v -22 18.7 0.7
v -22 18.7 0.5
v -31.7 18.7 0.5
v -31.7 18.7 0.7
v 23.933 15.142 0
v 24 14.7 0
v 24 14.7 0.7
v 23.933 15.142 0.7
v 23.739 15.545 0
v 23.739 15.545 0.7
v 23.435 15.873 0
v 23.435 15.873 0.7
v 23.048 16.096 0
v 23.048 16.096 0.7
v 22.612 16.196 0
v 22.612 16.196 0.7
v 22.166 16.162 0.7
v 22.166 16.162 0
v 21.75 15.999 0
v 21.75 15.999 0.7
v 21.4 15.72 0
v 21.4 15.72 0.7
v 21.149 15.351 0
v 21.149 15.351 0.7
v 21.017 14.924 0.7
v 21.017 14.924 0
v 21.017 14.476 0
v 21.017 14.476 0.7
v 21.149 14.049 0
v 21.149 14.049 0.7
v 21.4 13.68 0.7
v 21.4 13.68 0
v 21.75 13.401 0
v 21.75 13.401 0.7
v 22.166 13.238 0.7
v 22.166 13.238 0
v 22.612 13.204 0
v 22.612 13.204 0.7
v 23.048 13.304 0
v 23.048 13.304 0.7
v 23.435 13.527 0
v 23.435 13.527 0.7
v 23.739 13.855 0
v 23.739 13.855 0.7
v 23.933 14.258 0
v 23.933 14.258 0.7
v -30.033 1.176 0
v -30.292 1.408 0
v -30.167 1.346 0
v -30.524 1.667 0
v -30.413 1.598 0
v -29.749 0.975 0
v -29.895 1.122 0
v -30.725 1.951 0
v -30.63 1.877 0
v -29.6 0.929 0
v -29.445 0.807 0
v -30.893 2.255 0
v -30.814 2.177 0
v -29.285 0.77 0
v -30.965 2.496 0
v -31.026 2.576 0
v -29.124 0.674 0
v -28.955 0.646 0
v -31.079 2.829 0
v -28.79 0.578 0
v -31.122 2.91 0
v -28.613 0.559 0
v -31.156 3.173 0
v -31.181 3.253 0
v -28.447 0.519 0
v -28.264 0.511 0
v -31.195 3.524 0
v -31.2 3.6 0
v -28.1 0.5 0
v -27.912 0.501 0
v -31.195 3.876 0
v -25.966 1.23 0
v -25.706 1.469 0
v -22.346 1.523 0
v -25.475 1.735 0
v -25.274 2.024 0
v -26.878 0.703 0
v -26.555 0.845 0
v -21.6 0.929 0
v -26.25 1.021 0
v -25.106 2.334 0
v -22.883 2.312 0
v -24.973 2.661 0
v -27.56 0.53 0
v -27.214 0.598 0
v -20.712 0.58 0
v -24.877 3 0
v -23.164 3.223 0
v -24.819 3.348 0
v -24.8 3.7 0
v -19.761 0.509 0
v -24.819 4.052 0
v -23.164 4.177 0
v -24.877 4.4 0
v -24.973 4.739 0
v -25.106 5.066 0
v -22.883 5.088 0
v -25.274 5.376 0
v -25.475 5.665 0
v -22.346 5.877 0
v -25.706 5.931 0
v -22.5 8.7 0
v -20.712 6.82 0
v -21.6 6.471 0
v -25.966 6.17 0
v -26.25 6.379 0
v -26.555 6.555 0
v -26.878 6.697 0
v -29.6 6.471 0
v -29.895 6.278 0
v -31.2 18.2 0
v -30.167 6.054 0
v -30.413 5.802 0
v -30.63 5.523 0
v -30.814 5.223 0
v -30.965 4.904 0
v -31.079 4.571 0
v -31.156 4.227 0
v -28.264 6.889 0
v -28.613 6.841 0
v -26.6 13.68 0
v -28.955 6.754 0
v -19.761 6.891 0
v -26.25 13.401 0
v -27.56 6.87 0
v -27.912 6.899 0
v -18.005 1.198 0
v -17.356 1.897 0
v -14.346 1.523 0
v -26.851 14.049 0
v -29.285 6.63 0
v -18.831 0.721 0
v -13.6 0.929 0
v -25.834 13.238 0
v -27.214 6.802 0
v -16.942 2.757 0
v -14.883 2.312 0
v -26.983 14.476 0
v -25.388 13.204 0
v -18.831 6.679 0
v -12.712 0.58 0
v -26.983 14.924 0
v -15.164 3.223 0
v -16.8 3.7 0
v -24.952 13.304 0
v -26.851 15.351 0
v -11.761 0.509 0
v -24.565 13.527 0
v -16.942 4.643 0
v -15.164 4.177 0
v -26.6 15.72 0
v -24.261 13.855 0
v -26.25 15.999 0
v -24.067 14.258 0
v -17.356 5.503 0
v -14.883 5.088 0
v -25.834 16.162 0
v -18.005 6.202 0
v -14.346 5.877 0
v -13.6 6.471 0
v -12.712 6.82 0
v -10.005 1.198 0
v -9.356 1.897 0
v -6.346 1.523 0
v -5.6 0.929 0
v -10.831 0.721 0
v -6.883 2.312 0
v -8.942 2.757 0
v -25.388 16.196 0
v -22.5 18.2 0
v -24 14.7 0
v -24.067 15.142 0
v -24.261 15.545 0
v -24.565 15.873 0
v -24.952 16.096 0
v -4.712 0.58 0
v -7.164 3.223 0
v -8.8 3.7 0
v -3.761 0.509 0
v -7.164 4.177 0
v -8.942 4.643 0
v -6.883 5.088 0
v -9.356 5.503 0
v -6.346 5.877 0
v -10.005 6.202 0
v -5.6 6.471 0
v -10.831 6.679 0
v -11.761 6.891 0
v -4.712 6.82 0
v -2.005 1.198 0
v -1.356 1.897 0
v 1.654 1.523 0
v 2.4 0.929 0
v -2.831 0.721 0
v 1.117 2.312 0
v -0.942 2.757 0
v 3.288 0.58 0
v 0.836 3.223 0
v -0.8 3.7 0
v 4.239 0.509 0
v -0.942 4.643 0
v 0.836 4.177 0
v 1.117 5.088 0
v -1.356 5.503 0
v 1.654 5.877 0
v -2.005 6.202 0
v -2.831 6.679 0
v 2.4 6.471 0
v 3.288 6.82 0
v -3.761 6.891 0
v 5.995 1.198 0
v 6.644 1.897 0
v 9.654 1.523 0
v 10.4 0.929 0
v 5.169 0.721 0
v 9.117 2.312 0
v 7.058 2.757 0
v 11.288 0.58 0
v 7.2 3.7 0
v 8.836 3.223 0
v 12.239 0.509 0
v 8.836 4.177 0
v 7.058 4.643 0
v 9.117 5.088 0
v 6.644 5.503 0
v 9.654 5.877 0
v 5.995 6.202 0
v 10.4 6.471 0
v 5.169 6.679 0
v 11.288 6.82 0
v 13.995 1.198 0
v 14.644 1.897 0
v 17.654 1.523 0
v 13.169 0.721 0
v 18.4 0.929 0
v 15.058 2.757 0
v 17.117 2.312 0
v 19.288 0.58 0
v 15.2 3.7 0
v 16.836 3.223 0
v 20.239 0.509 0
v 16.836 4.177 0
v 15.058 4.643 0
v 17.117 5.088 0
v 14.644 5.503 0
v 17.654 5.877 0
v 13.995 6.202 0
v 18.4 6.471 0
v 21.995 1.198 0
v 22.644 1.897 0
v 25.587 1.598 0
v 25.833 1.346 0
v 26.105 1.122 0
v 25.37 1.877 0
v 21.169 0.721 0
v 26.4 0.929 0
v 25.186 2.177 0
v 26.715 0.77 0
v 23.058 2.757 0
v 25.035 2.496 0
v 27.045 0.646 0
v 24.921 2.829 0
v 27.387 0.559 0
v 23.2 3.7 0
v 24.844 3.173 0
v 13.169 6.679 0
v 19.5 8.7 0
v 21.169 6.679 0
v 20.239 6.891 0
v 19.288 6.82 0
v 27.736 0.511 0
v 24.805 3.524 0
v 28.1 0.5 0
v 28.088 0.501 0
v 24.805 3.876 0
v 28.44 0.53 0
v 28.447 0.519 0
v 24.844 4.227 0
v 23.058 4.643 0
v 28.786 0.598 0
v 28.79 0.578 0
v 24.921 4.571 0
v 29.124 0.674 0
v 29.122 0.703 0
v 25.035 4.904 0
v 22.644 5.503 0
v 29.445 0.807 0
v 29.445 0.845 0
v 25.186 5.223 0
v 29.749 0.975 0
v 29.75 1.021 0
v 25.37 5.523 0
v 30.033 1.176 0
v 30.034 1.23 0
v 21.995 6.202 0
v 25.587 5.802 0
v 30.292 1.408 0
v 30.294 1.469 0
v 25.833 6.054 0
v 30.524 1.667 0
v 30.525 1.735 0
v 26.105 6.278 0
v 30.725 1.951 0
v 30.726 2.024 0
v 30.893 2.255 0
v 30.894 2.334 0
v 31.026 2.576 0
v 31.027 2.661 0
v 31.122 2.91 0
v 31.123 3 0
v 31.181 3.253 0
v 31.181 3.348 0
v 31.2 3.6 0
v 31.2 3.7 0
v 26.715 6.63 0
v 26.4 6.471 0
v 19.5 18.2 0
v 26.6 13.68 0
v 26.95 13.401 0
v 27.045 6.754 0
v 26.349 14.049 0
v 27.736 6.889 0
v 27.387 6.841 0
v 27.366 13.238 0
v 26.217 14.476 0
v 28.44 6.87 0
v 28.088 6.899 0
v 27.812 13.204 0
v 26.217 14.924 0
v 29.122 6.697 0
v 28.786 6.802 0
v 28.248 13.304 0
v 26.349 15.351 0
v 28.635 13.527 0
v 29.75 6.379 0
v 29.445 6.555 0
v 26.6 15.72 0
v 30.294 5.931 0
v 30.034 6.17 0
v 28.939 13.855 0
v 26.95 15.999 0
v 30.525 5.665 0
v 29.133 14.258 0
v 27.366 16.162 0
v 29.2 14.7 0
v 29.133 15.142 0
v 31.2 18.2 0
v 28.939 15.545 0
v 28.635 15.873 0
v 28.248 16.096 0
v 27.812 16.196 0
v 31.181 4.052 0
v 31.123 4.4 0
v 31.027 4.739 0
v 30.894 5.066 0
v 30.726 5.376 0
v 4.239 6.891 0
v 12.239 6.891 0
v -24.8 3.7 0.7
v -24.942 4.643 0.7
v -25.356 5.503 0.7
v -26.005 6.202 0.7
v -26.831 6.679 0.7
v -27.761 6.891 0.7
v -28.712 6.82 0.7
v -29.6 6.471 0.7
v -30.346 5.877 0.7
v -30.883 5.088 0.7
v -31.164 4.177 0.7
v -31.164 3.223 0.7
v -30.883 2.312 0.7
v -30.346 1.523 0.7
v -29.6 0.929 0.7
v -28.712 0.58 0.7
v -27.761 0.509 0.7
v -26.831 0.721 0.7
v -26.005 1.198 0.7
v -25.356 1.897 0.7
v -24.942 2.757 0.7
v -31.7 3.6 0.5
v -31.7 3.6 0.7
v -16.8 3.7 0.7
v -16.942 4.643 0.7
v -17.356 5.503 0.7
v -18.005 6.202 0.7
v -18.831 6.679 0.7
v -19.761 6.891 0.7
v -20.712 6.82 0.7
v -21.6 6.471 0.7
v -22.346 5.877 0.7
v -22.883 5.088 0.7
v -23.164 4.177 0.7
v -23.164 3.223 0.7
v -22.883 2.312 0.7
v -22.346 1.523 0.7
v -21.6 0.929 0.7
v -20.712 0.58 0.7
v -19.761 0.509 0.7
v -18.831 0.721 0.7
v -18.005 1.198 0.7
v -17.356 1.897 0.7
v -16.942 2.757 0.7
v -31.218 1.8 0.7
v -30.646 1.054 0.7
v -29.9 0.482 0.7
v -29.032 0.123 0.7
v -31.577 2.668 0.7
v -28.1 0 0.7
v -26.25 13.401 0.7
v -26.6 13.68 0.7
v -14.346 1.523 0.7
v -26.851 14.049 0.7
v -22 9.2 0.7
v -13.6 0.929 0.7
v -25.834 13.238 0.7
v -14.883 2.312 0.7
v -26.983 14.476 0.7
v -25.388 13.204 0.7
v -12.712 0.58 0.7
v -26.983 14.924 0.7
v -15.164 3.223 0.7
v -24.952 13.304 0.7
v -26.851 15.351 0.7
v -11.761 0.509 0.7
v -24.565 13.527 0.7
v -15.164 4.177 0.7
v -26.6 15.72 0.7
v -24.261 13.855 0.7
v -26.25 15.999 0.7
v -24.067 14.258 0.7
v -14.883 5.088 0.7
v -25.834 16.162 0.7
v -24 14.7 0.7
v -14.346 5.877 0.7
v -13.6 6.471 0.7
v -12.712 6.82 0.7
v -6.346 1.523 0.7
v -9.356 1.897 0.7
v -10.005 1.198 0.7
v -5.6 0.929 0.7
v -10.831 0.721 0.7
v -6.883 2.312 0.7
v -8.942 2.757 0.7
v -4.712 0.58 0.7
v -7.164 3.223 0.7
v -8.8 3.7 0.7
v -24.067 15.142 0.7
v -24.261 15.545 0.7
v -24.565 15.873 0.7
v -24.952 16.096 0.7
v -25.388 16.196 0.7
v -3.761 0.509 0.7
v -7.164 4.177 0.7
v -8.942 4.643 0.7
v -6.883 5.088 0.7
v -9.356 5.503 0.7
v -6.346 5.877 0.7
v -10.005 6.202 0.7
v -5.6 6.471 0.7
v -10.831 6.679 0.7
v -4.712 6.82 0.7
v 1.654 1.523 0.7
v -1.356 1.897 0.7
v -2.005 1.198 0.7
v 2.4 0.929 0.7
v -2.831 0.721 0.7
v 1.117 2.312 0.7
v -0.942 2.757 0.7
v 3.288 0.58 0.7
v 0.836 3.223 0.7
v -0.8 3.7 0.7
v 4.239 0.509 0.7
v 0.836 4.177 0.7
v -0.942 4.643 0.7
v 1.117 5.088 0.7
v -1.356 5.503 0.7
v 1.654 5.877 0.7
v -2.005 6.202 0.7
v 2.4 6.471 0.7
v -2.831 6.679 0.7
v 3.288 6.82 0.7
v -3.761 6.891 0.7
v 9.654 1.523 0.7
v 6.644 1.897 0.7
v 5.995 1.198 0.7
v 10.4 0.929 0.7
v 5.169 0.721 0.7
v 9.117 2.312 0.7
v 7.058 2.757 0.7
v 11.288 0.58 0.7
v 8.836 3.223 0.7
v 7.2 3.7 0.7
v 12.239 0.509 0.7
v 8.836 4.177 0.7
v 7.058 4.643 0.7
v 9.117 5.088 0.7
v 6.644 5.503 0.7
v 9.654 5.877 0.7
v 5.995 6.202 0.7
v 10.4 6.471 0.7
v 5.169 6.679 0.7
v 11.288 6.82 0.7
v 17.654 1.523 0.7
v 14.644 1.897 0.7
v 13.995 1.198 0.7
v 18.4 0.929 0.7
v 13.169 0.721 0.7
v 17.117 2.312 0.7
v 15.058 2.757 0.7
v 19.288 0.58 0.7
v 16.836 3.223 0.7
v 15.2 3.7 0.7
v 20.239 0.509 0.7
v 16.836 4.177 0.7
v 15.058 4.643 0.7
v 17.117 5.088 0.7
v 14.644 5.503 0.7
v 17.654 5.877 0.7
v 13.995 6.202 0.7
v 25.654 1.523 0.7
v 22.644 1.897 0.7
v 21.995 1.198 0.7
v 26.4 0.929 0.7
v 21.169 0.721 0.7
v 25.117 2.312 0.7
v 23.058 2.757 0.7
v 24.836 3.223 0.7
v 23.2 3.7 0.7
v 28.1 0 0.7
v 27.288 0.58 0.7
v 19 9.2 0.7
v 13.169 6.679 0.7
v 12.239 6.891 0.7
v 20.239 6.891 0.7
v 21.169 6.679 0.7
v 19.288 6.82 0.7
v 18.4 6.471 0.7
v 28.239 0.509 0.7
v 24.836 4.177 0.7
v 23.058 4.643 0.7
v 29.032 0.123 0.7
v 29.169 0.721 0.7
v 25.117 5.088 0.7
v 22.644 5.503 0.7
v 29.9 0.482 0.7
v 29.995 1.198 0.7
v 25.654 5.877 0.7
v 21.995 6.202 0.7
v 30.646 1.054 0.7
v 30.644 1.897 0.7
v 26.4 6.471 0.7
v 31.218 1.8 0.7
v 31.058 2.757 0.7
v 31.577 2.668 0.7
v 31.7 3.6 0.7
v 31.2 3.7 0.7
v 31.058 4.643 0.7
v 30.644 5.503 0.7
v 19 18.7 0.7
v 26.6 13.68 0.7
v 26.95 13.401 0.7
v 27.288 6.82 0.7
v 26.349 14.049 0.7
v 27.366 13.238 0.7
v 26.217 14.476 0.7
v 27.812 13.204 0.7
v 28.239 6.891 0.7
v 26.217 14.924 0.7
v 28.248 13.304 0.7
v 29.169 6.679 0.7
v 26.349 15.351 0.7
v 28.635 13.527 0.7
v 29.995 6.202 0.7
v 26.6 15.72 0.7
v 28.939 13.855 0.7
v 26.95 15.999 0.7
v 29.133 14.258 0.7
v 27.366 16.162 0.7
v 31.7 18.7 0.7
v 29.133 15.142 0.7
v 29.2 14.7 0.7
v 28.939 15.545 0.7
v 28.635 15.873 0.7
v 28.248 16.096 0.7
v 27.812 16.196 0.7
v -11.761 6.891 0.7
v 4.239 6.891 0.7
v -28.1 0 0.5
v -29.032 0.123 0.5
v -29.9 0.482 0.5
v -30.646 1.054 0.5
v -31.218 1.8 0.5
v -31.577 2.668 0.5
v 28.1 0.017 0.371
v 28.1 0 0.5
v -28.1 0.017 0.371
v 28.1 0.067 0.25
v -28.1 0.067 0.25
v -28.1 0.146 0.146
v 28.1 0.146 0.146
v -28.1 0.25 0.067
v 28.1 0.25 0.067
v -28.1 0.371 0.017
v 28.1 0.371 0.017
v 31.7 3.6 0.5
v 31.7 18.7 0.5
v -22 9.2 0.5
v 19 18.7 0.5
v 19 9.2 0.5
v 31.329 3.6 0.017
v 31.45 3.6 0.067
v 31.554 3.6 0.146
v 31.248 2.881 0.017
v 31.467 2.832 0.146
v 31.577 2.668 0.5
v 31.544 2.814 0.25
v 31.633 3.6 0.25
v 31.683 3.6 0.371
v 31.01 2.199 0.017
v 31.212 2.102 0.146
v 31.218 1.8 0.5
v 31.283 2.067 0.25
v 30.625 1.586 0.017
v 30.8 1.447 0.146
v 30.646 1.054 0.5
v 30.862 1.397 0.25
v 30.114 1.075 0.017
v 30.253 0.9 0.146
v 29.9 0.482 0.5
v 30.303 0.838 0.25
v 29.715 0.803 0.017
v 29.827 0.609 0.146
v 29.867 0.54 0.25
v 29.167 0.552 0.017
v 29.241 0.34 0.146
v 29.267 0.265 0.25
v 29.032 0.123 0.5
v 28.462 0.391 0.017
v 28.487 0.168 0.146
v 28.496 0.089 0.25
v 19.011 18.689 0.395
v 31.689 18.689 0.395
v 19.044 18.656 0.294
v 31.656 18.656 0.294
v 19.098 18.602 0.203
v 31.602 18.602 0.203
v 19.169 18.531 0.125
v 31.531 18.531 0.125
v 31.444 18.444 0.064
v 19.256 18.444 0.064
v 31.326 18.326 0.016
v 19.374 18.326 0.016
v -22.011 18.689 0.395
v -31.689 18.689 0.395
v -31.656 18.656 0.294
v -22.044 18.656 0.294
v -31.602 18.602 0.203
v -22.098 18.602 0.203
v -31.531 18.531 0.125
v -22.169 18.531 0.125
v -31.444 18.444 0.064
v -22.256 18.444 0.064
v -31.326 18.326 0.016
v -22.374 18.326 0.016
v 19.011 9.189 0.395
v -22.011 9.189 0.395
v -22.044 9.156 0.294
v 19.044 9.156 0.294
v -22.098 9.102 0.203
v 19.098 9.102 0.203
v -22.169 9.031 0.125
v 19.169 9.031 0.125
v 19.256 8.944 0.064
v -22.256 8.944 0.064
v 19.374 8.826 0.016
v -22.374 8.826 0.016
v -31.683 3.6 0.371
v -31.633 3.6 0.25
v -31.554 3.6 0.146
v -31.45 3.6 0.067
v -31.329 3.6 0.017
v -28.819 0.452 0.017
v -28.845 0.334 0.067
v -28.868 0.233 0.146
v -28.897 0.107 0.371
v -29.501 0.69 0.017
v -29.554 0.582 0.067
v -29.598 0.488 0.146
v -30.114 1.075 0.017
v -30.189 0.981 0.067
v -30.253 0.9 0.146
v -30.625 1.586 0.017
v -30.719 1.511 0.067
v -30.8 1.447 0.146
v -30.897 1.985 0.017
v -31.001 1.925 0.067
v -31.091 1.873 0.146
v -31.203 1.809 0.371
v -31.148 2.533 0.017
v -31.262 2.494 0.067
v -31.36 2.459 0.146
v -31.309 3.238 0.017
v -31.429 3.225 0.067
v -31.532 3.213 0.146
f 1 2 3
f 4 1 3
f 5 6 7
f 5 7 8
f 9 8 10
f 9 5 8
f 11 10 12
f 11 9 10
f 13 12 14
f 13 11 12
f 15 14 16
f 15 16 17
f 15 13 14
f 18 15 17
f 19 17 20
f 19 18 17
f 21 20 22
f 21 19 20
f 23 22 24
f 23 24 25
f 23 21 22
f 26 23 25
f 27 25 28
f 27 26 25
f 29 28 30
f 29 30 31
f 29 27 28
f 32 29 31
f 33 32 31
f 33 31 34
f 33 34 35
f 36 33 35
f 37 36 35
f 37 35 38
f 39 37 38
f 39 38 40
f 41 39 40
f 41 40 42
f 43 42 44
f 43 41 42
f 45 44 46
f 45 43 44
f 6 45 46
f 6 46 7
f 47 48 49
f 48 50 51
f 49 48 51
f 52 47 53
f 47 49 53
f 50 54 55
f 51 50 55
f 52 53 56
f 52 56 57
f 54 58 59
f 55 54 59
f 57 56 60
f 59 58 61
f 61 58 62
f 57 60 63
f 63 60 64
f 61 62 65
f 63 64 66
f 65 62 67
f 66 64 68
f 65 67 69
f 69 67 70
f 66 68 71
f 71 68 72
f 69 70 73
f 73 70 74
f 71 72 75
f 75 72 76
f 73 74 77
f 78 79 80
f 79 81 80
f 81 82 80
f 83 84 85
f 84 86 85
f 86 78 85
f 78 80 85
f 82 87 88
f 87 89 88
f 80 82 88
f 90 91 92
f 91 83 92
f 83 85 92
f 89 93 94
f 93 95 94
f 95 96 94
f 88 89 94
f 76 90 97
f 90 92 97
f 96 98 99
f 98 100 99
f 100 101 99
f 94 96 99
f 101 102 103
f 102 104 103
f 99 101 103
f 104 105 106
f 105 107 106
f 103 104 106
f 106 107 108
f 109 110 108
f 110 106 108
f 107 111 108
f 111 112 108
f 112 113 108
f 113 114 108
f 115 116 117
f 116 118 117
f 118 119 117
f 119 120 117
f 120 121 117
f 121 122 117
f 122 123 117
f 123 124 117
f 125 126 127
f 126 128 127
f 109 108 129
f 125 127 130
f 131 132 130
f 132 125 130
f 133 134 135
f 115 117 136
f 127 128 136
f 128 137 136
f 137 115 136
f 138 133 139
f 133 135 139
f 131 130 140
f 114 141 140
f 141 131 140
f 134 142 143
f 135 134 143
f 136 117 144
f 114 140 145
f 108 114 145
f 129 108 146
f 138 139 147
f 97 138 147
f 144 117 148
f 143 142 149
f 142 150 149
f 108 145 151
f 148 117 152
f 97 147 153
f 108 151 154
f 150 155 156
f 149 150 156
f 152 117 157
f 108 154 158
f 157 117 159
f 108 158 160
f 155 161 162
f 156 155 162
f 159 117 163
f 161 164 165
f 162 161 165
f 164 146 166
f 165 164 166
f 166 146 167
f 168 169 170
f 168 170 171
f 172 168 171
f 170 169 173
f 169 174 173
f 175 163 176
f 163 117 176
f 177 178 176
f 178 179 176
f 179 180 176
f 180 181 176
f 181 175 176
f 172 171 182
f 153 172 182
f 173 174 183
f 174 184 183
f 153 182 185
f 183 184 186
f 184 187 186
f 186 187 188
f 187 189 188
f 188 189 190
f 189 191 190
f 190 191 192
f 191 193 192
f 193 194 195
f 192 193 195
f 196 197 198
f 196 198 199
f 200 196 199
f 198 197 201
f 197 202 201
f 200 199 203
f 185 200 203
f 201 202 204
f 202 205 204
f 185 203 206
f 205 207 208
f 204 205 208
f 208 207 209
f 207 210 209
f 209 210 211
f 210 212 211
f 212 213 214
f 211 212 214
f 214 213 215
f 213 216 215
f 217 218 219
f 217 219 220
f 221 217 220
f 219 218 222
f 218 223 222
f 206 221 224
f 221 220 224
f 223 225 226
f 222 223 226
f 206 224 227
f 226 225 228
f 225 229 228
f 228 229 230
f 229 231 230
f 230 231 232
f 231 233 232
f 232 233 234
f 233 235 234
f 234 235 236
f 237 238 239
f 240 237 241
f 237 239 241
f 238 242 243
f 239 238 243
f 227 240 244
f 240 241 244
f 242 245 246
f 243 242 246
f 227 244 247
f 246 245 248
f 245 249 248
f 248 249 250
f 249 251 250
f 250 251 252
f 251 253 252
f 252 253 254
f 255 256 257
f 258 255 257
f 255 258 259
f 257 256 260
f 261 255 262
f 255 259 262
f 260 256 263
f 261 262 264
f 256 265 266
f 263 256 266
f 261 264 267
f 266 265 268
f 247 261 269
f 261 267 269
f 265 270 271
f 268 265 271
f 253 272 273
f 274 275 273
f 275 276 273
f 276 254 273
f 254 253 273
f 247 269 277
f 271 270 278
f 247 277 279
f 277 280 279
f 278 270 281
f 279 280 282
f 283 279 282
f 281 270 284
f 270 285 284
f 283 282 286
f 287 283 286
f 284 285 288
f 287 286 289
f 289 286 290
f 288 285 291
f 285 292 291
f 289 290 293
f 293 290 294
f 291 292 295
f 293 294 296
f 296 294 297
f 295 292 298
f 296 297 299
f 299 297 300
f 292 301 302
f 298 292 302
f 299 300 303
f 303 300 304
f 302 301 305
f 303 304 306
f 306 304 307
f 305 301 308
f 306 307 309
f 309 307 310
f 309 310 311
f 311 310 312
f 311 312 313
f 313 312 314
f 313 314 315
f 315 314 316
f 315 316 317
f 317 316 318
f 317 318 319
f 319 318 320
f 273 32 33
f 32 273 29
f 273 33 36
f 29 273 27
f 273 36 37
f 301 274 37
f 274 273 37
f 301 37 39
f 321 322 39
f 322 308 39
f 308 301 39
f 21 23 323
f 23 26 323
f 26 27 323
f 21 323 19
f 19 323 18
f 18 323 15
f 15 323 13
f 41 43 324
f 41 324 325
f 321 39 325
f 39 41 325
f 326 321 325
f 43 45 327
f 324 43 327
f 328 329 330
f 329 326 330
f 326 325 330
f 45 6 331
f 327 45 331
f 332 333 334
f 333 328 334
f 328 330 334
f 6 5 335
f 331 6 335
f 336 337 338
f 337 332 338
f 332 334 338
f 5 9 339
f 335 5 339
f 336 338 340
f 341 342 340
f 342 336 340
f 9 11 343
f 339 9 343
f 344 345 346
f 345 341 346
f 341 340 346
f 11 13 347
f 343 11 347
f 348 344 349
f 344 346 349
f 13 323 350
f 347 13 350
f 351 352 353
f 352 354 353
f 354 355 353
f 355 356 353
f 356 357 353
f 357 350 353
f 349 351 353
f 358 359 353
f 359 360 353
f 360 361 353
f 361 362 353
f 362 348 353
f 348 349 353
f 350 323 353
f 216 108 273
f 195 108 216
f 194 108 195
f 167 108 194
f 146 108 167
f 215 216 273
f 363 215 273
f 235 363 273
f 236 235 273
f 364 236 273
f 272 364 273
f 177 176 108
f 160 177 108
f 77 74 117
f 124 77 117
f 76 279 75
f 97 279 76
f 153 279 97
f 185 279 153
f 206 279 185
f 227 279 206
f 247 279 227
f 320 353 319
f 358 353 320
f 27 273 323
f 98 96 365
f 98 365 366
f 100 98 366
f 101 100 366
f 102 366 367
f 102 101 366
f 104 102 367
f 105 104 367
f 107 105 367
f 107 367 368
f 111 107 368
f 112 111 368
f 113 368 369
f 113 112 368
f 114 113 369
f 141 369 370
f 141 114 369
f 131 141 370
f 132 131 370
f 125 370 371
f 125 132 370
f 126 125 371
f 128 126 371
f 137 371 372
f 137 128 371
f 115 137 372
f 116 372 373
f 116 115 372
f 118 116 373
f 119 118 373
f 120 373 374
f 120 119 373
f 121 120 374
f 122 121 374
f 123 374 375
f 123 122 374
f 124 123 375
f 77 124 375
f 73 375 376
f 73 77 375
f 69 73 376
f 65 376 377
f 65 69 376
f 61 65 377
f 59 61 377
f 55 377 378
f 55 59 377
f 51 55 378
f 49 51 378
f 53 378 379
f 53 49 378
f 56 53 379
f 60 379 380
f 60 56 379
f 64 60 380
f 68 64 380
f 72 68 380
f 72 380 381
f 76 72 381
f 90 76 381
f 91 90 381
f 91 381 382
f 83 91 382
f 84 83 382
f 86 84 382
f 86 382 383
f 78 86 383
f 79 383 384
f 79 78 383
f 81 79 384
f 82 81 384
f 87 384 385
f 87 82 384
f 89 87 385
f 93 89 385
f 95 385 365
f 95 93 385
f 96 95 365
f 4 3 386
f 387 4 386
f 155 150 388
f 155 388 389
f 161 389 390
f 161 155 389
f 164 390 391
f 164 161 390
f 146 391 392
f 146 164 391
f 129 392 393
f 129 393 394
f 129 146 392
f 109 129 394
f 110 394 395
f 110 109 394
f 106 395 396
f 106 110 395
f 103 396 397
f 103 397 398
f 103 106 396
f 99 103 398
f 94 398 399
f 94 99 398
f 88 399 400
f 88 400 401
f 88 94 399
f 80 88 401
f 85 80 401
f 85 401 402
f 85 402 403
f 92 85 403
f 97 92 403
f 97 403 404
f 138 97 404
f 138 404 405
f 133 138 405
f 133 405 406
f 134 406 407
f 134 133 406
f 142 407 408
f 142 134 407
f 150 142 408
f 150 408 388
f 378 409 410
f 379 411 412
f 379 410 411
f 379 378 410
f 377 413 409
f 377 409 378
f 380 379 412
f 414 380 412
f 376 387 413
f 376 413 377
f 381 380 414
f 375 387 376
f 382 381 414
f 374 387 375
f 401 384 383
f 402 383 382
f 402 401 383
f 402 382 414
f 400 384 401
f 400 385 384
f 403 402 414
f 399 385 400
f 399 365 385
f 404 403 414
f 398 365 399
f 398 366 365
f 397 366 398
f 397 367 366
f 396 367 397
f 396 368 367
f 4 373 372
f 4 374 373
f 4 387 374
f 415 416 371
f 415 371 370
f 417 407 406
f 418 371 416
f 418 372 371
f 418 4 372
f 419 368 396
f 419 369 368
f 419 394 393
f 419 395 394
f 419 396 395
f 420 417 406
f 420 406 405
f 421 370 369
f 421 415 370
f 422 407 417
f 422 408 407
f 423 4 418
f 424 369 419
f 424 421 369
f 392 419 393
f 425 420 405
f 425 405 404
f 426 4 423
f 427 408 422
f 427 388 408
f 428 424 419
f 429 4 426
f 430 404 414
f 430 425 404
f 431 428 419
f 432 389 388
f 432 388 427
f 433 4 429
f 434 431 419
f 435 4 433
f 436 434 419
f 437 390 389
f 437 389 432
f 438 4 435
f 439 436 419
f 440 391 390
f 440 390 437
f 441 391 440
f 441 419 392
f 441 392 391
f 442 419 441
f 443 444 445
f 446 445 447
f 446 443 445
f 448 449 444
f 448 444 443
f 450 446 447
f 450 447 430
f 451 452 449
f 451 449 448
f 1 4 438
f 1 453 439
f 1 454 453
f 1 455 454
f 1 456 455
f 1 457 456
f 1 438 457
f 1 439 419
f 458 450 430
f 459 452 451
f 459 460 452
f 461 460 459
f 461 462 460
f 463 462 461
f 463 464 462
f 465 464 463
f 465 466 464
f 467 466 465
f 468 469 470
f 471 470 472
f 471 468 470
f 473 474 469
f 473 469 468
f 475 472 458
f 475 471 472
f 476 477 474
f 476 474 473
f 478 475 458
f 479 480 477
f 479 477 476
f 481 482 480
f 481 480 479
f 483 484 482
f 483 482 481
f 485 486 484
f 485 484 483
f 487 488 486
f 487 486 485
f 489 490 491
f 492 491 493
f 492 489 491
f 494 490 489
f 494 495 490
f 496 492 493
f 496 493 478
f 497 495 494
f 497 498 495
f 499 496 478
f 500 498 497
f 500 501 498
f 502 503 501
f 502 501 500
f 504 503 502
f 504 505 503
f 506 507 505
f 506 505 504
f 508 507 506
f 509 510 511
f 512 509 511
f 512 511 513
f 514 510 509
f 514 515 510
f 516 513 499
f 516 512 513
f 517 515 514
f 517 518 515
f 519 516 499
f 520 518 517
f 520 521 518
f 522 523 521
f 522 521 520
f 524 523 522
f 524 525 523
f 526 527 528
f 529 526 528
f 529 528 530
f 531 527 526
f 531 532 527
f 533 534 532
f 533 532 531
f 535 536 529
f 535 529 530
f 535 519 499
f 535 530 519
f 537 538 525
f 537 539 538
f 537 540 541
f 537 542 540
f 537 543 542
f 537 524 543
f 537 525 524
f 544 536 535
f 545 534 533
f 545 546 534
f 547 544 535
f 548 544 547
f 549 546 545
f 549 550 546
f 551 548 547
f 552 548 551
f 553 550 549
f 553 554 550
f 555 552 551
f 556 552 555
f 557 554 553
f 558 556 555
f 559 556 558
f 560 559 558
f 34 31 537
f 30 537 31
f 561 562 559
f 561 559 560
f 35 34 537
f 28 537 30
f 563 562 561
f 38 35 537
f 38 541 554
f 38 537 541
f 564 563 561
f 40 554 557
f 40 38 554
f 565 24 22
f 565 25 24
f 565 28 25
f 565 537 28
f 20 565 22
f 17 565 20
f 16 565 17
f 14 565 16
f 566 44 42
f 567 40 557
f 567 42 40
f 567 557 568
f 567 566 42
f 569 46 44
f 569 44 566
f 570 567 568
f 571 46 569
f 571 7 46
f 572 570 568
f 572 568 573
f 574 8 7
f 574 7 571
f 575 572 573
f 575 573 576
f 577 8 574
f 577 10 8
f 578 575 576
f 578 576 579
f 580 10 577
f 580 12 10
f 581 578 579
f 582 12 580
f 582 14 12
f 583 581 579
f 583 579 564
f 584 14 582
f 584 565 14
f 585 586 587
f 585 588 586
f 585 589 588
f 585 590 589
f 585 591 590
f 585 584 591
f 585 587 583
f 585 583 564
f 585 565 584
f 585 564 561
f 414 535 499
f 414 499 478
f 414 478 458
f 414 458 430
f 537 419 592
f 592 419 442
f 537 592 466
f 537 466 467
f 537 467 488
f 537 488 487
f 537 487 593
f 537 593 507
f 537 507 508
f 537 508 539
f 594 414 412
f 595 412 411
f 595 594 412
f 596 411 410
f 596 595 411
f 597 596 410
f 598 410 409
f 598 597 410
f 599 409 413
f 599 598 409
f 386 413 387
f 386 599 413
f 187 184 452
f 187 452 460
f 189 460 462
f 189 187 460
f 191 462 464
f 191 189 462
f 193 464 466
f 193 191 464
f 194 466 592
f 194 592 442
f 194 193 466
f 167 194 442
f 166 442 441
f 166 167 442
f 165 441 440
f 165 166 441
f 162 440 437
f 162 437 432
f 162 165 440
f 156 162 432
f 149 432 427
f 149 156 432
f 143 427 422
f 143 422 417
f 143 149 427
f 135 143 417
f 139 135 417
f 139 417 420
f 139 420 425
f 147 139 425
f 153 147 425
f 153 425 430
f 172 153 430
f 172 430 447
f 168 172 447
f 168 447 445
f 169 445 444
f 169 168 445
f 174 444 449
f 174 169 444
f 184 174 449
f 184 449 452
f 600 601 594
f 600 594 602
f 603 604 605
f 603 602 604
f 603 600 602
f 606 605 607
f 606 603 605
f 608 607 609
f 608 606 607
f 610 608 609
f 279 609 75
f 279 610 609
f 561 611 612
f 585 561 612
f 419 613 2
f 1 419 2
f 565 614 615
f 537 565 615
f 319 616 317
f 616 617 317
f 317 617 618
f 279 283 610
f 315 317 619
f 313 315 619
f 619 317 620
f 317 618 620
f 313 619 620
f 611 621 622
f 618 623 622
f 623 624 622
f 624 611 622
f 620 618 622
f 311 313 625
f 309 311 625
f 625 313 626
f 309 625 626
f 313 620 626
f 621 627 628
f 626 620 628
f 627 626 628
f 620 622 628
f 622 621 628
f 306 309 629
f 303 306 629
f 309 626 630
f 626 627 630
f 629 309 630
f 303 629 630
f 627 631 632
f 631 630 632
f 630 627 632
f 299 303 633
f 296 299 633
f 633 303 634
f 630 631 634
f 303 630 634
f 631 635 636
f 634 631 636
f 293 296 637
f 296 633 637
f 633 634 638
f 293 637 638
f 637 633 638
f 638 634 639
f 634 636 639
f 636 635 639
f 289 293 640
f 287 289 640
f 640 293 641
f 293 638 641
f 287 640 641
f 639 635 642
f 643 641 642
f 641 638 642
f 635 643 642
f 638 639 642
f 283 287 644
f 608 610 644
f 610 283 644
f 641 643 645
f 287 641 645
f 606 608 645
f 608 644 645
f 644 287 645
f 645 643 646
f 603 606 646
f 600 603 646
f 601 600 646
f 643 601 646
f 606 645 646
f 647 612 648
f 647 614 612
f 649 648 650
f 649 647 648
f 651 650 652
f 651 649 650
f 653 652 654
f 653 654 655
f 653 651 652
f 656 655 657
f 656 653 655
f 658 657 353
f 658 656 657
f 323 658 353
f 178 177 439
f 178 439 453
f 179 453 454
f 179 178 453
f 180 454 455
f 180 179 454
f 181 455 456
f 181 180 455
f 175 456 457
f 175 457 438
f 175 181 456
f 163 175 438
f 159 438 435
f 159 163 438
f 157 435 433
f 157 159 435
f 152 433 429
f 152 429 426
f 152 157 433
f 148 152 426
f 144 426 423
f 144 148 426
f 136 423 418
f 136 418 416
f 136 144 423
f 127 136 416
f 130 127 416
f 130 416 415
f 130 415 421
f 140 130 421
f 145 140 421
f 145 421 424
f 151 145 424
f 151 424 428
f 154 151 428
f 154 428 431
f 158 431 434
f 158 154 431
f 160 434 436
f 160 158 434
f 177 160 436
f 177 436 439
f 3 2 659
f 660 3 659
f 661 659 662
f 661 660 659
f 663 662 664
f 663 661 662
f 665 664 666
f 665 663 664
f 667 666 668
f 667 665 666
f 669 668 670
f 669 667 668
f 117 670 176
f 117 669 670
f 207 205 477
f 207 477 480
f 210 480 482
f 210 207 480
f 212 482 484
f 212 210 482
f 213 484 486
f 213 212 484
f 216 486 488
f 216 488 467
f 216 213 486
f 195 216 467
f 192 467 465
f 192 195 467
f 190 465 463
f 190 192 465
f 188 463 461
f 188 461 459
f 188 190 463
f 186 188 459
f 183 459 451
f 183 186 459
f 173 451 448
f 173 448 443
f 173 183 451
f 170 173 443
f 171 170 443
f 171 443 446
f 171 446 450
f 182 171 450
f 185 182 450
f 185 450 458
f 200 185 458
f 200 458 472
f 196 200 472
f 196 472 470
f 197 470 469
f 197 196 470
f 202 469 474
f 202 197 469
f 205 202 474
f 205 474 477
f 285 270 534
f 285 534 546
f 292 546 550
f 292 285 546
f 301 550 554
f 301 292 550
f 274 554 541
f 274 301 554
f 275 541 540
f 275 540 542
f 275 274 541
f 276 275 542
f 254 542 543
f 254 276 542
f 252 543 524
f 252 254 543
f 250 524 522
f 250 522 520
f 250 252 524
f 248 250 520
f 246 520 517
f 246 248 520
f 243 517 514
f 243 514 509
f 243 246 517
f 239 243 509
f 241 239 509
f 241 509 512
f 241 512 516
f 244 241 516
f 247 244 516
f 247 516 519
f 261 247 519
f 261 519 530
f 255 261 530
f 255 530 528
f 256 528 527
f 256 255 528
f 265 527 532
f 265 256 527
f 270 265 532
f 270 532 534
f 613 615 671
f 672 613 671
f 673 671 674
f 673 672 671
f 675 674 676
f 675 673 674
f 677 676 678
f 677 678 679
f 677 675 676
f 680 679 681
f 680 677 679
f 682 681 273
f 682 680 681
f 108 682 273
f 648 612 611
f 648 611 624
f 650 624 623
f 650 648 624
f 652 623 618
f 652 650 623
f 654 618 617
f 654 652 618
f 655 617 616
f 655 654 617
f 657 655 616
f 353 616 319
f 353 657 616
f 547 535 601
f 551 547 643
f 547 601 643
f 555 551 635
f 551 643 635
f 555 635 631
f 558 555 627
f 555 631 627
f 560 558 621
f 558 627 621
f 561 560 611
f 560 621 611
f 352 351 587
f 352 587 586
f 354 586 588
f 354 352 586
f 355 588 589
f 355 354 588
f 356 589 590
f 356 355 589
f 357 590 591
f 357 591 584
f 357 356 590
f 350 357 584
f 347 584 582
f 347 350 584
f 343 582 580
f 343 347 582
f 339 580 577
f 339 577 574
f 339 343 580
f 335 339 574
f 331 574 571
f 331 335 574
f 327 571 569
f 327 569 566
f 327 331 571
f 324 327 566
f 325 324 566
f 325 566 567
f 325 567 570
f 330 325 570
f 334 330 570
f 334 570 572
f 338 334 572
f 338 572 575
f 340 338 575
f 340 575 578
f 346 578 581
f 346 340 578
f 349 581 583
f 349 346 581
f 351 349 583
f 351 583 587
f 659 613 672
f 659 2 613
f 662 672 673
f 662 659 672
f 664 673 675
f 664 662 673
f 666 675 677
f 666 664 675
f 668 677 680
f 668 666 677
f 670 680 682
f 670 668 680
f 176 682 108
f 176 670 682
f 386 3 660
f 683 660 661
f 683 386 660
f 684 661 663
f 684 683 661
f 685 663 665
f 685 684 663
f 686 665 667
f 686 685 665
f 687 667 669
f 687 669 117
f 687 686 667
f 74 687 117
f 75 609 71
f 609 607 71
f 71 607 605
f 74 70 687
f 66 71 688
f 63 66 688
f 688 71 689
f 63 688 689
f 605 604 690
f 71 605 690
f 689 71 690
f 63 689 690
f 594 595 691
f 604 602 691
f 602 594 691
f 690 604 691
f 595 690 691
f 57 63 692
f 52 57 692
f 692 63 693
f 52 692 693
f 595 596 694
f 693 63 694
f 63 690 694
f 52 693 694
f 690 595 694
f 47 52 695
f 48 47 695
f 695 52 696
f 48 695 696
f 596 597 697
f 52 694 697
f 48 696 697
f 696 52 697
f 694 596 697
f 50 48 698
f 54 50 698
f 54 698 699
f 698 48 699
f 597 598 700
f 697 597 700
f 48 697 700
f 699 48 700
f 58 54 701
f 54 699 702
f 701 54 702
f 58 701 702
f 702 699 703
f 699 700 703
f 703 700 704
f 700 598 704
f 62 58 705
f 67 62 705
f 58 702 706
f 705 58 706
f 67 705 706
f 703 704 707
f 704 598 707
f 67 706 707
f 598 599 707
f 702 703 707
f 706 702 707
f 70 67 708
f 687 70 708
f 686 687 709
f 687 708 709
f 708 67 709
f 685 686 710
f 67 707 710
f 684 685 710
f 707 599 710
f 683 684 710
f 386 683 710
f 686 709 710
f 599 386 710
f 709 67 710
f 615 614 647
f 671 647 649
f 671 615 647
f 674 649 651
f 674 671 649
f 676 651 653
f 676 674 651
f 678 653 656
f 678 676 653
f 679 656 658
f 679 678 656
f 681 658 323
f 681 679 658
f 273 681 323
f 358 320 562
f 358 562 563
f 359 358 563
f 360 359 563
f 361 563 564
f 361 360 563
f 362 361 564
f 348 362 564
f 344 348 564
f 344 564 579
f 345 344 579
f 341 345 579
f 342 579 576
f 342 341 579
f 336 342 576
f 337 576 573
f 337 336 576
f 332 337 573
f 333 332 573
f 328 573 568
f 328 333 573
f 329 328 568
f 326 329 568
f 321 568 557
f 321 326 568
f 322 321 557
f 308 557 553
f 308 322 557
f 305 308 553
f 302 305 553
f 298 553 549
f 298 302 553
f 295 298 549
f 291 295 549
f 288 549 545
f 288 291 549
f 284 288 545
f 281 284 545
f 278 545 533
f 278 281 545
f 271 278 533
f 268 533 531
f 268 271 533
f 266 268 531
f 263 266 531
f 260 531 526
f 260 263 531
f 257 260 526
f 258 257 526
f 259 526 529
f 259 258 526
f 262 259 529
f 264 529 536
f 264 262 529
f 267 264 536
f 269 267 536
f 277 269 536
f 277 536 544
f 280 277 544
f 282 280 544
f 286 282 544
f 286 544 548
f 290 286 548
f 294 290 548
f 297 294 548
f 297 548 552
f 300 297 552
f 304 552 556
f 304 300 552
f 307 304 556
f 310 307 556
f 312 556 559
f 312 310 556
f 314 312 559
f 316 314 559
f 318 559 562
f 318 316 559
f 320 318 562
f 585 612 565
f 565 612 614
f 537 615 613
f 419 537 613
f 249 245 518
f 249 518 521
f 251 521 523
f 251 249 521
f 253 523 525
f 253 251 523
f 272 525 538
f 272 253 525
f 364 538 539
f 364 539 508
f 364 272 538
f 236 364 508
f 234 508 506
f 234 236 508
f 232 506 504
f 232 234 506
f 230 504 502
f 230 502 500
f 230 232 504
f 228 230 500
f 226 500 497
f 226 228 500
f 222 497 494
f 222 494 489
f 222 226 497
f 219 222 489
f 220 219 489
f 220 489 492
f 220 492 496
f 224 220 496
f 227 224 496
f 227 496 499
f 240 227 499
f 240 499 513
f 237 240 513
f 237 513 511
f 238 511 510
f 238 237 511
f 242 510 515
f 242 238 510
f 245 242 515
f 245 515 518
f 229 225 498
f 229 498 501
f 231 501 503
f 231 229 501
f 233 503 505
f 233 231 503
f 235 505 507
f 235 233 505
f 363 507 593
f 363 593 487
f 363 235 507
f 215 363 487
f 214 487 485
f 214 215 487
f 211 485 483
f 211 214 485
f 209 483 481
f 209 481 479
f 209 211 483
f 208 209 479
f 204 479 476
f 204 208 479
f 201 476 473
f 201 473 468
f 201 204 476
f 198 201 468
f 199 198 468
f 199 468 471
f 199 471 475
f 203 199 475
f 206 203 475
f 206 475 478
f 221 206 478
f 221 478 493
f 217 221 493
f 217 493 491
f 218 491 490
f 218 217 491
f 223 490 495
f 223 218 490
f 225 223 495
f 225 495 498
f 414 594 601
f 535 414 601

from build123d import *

# Parameters (mm, degrees)
F0_R        = 3.2
F0_R_2      = 1.5
F1_DEPTH    = 0.7
F2_R        = 0.49999
F3_T1_DEPTH = 9.7
F3_T4_ANGLE = 90
F3_T6_ANGLE = 90


# Not quite as in the source:
# - a fillet or chamfer that OpenCascade refuses, or shapes differently, is made with other operations: its cross-section is extruded or revolved along the edge and cut away or added
# - a fillet or chamfer is up to 0.001 mm smaller than in the source, because OpenCascade refuses the exact size


with BuildPart() as f1:
    # F0 (on Top) → F1 (new body)
    with BuildSketch(Plane.XY):
        Polygon((-22, 18.7), (-31.7, 18.7), (-31.7, 0), (-18.3513443917, 0), (-10.3513443917, 0), (31.7, 0), (31.7, 18.7), (19, 18.7), (19, 9.2), (-22, 9.2), align=None)
        with Locations((-28, 3.7)):
            Circle(F0_R, mode=Mode.SUBTRACT)
        with Locations((-20, 3.7)):
            Circle(F0_R, mode=Mode.SUBTRACT)
        with Locations((-12, 3.7)):
            Circle(F0_R, mode=Mode.SUBTRACT)
        with Locations((-4, 3.7)):
            Circle(F0_R, mode=Mode.SUBTRACT)
        with Locations((4, 3.7)):
            Circle(F0_R, mode=Mode.SUBTRACT)
        with Locations((12, 3.7)):
            Circle(F0_R, mode=Mode.SUBTRACT)
        with Locations((20, 3.7)):
            Circle(F0_R, mode=Mode.SUBTRACT)
        with Locations((28, 3.7)):
            Circle(F0_R, mode=Mode.SUBTRACT)
        with Locations((-25.5, 14.7)):
            Circle(F0_R_2, mode=Mode.SUBTRACT)
        with Locations((22.5, 14.7)):
            Circle(F0_R_2, mode=Mode.SUBTRACT)
        with Locations((27.7, 14.7)):
            Circle(F0_R_2, mode=Mode.SUBTRACT)
    extrude(amount=F1_DEPTH)

    # F2 (radius 0.5 in the source; OpenCascade refuses exactly that, so slightly less here)
    f2_edges = [f1.edges().sort_by_distance(p)[0] for p in [
        (-31.7, 9.35, 0),
        (0, 0, 0),
        (31.7, 9.35, 0),
        (25.35, 18.7, 0),
        (19, 13.95, 0),
        (-1.5, 9.2, 0),
        (-22, 13.95, 0),
        (-26.85, 18.7, 0),
    ]]
    fillet(f2_edges, radius=F2_R)

    # F3: fillet of radius 3.6 on 4 edges, made by hand

    # F3_s2 → F3_t1 (cut)
    with BuildSketch(Plane.XY):
        with BuildLine():
            ThreePointArc((-28.1, 0), (-30.6455844123, 1.0544155877), (-31.7, 3.6))
            Line((-31.7, 3.6), (-31.7, 0))
            Line((-31.7, 0), (-28.1, 0))
        make_face()
        with BuildLine():
            ThreePointArc((28.1, 0), (30.6455844123, 1.0544155877), (31.7, 3.6))
            Line((31.7, 3.6), (31.7, 0))
            Line((31.7, 0), (28.1, 0))
        make_face()
    extrude(amount=F3_T1_DEPTH, mode=Mode.SUBTRACT)

    # F3_s3 → F3_t4 (revolve, cut)
    with BuildSketch(Plane.YZ.offset(-28.1)):
        with BuildLine():
            ThreePointArc((0.49999, 0), (0.1464436805, 0.1464436805), (0, 0.49999))
            Line((0, 0.49999), (0, 0))
            Line((0, 0), (0.49999, 0))
        make_face()
    revolve(axis=Axis((-28.1, 3.6, 0), (0, 0, -1)), revolution_arc=F3_T4_ANGLE, mode=Mode.SUBTRACT)

    # F3_s5 → F3_t6 (revolve, cut)
    with BuildSketch(Plane.XZ.offset(-3.6)):
        with BuildLine():
            ThreePointArc((31.20001, 0), (31.5535563195, 0.1464436805), (31.7, 0.49999))
            Line((31.7, 0.49999), (31.7, 0))
            Line((31.7, 0), (31.20001, 0))
        make_face()
    revolve(axis=Axis((28.1, 3.6, 0), (0, 0, -1)), revolution_arc=F3_T6_ANGLE, mode=Mode.SUBTRACT)


solid = f1.part
